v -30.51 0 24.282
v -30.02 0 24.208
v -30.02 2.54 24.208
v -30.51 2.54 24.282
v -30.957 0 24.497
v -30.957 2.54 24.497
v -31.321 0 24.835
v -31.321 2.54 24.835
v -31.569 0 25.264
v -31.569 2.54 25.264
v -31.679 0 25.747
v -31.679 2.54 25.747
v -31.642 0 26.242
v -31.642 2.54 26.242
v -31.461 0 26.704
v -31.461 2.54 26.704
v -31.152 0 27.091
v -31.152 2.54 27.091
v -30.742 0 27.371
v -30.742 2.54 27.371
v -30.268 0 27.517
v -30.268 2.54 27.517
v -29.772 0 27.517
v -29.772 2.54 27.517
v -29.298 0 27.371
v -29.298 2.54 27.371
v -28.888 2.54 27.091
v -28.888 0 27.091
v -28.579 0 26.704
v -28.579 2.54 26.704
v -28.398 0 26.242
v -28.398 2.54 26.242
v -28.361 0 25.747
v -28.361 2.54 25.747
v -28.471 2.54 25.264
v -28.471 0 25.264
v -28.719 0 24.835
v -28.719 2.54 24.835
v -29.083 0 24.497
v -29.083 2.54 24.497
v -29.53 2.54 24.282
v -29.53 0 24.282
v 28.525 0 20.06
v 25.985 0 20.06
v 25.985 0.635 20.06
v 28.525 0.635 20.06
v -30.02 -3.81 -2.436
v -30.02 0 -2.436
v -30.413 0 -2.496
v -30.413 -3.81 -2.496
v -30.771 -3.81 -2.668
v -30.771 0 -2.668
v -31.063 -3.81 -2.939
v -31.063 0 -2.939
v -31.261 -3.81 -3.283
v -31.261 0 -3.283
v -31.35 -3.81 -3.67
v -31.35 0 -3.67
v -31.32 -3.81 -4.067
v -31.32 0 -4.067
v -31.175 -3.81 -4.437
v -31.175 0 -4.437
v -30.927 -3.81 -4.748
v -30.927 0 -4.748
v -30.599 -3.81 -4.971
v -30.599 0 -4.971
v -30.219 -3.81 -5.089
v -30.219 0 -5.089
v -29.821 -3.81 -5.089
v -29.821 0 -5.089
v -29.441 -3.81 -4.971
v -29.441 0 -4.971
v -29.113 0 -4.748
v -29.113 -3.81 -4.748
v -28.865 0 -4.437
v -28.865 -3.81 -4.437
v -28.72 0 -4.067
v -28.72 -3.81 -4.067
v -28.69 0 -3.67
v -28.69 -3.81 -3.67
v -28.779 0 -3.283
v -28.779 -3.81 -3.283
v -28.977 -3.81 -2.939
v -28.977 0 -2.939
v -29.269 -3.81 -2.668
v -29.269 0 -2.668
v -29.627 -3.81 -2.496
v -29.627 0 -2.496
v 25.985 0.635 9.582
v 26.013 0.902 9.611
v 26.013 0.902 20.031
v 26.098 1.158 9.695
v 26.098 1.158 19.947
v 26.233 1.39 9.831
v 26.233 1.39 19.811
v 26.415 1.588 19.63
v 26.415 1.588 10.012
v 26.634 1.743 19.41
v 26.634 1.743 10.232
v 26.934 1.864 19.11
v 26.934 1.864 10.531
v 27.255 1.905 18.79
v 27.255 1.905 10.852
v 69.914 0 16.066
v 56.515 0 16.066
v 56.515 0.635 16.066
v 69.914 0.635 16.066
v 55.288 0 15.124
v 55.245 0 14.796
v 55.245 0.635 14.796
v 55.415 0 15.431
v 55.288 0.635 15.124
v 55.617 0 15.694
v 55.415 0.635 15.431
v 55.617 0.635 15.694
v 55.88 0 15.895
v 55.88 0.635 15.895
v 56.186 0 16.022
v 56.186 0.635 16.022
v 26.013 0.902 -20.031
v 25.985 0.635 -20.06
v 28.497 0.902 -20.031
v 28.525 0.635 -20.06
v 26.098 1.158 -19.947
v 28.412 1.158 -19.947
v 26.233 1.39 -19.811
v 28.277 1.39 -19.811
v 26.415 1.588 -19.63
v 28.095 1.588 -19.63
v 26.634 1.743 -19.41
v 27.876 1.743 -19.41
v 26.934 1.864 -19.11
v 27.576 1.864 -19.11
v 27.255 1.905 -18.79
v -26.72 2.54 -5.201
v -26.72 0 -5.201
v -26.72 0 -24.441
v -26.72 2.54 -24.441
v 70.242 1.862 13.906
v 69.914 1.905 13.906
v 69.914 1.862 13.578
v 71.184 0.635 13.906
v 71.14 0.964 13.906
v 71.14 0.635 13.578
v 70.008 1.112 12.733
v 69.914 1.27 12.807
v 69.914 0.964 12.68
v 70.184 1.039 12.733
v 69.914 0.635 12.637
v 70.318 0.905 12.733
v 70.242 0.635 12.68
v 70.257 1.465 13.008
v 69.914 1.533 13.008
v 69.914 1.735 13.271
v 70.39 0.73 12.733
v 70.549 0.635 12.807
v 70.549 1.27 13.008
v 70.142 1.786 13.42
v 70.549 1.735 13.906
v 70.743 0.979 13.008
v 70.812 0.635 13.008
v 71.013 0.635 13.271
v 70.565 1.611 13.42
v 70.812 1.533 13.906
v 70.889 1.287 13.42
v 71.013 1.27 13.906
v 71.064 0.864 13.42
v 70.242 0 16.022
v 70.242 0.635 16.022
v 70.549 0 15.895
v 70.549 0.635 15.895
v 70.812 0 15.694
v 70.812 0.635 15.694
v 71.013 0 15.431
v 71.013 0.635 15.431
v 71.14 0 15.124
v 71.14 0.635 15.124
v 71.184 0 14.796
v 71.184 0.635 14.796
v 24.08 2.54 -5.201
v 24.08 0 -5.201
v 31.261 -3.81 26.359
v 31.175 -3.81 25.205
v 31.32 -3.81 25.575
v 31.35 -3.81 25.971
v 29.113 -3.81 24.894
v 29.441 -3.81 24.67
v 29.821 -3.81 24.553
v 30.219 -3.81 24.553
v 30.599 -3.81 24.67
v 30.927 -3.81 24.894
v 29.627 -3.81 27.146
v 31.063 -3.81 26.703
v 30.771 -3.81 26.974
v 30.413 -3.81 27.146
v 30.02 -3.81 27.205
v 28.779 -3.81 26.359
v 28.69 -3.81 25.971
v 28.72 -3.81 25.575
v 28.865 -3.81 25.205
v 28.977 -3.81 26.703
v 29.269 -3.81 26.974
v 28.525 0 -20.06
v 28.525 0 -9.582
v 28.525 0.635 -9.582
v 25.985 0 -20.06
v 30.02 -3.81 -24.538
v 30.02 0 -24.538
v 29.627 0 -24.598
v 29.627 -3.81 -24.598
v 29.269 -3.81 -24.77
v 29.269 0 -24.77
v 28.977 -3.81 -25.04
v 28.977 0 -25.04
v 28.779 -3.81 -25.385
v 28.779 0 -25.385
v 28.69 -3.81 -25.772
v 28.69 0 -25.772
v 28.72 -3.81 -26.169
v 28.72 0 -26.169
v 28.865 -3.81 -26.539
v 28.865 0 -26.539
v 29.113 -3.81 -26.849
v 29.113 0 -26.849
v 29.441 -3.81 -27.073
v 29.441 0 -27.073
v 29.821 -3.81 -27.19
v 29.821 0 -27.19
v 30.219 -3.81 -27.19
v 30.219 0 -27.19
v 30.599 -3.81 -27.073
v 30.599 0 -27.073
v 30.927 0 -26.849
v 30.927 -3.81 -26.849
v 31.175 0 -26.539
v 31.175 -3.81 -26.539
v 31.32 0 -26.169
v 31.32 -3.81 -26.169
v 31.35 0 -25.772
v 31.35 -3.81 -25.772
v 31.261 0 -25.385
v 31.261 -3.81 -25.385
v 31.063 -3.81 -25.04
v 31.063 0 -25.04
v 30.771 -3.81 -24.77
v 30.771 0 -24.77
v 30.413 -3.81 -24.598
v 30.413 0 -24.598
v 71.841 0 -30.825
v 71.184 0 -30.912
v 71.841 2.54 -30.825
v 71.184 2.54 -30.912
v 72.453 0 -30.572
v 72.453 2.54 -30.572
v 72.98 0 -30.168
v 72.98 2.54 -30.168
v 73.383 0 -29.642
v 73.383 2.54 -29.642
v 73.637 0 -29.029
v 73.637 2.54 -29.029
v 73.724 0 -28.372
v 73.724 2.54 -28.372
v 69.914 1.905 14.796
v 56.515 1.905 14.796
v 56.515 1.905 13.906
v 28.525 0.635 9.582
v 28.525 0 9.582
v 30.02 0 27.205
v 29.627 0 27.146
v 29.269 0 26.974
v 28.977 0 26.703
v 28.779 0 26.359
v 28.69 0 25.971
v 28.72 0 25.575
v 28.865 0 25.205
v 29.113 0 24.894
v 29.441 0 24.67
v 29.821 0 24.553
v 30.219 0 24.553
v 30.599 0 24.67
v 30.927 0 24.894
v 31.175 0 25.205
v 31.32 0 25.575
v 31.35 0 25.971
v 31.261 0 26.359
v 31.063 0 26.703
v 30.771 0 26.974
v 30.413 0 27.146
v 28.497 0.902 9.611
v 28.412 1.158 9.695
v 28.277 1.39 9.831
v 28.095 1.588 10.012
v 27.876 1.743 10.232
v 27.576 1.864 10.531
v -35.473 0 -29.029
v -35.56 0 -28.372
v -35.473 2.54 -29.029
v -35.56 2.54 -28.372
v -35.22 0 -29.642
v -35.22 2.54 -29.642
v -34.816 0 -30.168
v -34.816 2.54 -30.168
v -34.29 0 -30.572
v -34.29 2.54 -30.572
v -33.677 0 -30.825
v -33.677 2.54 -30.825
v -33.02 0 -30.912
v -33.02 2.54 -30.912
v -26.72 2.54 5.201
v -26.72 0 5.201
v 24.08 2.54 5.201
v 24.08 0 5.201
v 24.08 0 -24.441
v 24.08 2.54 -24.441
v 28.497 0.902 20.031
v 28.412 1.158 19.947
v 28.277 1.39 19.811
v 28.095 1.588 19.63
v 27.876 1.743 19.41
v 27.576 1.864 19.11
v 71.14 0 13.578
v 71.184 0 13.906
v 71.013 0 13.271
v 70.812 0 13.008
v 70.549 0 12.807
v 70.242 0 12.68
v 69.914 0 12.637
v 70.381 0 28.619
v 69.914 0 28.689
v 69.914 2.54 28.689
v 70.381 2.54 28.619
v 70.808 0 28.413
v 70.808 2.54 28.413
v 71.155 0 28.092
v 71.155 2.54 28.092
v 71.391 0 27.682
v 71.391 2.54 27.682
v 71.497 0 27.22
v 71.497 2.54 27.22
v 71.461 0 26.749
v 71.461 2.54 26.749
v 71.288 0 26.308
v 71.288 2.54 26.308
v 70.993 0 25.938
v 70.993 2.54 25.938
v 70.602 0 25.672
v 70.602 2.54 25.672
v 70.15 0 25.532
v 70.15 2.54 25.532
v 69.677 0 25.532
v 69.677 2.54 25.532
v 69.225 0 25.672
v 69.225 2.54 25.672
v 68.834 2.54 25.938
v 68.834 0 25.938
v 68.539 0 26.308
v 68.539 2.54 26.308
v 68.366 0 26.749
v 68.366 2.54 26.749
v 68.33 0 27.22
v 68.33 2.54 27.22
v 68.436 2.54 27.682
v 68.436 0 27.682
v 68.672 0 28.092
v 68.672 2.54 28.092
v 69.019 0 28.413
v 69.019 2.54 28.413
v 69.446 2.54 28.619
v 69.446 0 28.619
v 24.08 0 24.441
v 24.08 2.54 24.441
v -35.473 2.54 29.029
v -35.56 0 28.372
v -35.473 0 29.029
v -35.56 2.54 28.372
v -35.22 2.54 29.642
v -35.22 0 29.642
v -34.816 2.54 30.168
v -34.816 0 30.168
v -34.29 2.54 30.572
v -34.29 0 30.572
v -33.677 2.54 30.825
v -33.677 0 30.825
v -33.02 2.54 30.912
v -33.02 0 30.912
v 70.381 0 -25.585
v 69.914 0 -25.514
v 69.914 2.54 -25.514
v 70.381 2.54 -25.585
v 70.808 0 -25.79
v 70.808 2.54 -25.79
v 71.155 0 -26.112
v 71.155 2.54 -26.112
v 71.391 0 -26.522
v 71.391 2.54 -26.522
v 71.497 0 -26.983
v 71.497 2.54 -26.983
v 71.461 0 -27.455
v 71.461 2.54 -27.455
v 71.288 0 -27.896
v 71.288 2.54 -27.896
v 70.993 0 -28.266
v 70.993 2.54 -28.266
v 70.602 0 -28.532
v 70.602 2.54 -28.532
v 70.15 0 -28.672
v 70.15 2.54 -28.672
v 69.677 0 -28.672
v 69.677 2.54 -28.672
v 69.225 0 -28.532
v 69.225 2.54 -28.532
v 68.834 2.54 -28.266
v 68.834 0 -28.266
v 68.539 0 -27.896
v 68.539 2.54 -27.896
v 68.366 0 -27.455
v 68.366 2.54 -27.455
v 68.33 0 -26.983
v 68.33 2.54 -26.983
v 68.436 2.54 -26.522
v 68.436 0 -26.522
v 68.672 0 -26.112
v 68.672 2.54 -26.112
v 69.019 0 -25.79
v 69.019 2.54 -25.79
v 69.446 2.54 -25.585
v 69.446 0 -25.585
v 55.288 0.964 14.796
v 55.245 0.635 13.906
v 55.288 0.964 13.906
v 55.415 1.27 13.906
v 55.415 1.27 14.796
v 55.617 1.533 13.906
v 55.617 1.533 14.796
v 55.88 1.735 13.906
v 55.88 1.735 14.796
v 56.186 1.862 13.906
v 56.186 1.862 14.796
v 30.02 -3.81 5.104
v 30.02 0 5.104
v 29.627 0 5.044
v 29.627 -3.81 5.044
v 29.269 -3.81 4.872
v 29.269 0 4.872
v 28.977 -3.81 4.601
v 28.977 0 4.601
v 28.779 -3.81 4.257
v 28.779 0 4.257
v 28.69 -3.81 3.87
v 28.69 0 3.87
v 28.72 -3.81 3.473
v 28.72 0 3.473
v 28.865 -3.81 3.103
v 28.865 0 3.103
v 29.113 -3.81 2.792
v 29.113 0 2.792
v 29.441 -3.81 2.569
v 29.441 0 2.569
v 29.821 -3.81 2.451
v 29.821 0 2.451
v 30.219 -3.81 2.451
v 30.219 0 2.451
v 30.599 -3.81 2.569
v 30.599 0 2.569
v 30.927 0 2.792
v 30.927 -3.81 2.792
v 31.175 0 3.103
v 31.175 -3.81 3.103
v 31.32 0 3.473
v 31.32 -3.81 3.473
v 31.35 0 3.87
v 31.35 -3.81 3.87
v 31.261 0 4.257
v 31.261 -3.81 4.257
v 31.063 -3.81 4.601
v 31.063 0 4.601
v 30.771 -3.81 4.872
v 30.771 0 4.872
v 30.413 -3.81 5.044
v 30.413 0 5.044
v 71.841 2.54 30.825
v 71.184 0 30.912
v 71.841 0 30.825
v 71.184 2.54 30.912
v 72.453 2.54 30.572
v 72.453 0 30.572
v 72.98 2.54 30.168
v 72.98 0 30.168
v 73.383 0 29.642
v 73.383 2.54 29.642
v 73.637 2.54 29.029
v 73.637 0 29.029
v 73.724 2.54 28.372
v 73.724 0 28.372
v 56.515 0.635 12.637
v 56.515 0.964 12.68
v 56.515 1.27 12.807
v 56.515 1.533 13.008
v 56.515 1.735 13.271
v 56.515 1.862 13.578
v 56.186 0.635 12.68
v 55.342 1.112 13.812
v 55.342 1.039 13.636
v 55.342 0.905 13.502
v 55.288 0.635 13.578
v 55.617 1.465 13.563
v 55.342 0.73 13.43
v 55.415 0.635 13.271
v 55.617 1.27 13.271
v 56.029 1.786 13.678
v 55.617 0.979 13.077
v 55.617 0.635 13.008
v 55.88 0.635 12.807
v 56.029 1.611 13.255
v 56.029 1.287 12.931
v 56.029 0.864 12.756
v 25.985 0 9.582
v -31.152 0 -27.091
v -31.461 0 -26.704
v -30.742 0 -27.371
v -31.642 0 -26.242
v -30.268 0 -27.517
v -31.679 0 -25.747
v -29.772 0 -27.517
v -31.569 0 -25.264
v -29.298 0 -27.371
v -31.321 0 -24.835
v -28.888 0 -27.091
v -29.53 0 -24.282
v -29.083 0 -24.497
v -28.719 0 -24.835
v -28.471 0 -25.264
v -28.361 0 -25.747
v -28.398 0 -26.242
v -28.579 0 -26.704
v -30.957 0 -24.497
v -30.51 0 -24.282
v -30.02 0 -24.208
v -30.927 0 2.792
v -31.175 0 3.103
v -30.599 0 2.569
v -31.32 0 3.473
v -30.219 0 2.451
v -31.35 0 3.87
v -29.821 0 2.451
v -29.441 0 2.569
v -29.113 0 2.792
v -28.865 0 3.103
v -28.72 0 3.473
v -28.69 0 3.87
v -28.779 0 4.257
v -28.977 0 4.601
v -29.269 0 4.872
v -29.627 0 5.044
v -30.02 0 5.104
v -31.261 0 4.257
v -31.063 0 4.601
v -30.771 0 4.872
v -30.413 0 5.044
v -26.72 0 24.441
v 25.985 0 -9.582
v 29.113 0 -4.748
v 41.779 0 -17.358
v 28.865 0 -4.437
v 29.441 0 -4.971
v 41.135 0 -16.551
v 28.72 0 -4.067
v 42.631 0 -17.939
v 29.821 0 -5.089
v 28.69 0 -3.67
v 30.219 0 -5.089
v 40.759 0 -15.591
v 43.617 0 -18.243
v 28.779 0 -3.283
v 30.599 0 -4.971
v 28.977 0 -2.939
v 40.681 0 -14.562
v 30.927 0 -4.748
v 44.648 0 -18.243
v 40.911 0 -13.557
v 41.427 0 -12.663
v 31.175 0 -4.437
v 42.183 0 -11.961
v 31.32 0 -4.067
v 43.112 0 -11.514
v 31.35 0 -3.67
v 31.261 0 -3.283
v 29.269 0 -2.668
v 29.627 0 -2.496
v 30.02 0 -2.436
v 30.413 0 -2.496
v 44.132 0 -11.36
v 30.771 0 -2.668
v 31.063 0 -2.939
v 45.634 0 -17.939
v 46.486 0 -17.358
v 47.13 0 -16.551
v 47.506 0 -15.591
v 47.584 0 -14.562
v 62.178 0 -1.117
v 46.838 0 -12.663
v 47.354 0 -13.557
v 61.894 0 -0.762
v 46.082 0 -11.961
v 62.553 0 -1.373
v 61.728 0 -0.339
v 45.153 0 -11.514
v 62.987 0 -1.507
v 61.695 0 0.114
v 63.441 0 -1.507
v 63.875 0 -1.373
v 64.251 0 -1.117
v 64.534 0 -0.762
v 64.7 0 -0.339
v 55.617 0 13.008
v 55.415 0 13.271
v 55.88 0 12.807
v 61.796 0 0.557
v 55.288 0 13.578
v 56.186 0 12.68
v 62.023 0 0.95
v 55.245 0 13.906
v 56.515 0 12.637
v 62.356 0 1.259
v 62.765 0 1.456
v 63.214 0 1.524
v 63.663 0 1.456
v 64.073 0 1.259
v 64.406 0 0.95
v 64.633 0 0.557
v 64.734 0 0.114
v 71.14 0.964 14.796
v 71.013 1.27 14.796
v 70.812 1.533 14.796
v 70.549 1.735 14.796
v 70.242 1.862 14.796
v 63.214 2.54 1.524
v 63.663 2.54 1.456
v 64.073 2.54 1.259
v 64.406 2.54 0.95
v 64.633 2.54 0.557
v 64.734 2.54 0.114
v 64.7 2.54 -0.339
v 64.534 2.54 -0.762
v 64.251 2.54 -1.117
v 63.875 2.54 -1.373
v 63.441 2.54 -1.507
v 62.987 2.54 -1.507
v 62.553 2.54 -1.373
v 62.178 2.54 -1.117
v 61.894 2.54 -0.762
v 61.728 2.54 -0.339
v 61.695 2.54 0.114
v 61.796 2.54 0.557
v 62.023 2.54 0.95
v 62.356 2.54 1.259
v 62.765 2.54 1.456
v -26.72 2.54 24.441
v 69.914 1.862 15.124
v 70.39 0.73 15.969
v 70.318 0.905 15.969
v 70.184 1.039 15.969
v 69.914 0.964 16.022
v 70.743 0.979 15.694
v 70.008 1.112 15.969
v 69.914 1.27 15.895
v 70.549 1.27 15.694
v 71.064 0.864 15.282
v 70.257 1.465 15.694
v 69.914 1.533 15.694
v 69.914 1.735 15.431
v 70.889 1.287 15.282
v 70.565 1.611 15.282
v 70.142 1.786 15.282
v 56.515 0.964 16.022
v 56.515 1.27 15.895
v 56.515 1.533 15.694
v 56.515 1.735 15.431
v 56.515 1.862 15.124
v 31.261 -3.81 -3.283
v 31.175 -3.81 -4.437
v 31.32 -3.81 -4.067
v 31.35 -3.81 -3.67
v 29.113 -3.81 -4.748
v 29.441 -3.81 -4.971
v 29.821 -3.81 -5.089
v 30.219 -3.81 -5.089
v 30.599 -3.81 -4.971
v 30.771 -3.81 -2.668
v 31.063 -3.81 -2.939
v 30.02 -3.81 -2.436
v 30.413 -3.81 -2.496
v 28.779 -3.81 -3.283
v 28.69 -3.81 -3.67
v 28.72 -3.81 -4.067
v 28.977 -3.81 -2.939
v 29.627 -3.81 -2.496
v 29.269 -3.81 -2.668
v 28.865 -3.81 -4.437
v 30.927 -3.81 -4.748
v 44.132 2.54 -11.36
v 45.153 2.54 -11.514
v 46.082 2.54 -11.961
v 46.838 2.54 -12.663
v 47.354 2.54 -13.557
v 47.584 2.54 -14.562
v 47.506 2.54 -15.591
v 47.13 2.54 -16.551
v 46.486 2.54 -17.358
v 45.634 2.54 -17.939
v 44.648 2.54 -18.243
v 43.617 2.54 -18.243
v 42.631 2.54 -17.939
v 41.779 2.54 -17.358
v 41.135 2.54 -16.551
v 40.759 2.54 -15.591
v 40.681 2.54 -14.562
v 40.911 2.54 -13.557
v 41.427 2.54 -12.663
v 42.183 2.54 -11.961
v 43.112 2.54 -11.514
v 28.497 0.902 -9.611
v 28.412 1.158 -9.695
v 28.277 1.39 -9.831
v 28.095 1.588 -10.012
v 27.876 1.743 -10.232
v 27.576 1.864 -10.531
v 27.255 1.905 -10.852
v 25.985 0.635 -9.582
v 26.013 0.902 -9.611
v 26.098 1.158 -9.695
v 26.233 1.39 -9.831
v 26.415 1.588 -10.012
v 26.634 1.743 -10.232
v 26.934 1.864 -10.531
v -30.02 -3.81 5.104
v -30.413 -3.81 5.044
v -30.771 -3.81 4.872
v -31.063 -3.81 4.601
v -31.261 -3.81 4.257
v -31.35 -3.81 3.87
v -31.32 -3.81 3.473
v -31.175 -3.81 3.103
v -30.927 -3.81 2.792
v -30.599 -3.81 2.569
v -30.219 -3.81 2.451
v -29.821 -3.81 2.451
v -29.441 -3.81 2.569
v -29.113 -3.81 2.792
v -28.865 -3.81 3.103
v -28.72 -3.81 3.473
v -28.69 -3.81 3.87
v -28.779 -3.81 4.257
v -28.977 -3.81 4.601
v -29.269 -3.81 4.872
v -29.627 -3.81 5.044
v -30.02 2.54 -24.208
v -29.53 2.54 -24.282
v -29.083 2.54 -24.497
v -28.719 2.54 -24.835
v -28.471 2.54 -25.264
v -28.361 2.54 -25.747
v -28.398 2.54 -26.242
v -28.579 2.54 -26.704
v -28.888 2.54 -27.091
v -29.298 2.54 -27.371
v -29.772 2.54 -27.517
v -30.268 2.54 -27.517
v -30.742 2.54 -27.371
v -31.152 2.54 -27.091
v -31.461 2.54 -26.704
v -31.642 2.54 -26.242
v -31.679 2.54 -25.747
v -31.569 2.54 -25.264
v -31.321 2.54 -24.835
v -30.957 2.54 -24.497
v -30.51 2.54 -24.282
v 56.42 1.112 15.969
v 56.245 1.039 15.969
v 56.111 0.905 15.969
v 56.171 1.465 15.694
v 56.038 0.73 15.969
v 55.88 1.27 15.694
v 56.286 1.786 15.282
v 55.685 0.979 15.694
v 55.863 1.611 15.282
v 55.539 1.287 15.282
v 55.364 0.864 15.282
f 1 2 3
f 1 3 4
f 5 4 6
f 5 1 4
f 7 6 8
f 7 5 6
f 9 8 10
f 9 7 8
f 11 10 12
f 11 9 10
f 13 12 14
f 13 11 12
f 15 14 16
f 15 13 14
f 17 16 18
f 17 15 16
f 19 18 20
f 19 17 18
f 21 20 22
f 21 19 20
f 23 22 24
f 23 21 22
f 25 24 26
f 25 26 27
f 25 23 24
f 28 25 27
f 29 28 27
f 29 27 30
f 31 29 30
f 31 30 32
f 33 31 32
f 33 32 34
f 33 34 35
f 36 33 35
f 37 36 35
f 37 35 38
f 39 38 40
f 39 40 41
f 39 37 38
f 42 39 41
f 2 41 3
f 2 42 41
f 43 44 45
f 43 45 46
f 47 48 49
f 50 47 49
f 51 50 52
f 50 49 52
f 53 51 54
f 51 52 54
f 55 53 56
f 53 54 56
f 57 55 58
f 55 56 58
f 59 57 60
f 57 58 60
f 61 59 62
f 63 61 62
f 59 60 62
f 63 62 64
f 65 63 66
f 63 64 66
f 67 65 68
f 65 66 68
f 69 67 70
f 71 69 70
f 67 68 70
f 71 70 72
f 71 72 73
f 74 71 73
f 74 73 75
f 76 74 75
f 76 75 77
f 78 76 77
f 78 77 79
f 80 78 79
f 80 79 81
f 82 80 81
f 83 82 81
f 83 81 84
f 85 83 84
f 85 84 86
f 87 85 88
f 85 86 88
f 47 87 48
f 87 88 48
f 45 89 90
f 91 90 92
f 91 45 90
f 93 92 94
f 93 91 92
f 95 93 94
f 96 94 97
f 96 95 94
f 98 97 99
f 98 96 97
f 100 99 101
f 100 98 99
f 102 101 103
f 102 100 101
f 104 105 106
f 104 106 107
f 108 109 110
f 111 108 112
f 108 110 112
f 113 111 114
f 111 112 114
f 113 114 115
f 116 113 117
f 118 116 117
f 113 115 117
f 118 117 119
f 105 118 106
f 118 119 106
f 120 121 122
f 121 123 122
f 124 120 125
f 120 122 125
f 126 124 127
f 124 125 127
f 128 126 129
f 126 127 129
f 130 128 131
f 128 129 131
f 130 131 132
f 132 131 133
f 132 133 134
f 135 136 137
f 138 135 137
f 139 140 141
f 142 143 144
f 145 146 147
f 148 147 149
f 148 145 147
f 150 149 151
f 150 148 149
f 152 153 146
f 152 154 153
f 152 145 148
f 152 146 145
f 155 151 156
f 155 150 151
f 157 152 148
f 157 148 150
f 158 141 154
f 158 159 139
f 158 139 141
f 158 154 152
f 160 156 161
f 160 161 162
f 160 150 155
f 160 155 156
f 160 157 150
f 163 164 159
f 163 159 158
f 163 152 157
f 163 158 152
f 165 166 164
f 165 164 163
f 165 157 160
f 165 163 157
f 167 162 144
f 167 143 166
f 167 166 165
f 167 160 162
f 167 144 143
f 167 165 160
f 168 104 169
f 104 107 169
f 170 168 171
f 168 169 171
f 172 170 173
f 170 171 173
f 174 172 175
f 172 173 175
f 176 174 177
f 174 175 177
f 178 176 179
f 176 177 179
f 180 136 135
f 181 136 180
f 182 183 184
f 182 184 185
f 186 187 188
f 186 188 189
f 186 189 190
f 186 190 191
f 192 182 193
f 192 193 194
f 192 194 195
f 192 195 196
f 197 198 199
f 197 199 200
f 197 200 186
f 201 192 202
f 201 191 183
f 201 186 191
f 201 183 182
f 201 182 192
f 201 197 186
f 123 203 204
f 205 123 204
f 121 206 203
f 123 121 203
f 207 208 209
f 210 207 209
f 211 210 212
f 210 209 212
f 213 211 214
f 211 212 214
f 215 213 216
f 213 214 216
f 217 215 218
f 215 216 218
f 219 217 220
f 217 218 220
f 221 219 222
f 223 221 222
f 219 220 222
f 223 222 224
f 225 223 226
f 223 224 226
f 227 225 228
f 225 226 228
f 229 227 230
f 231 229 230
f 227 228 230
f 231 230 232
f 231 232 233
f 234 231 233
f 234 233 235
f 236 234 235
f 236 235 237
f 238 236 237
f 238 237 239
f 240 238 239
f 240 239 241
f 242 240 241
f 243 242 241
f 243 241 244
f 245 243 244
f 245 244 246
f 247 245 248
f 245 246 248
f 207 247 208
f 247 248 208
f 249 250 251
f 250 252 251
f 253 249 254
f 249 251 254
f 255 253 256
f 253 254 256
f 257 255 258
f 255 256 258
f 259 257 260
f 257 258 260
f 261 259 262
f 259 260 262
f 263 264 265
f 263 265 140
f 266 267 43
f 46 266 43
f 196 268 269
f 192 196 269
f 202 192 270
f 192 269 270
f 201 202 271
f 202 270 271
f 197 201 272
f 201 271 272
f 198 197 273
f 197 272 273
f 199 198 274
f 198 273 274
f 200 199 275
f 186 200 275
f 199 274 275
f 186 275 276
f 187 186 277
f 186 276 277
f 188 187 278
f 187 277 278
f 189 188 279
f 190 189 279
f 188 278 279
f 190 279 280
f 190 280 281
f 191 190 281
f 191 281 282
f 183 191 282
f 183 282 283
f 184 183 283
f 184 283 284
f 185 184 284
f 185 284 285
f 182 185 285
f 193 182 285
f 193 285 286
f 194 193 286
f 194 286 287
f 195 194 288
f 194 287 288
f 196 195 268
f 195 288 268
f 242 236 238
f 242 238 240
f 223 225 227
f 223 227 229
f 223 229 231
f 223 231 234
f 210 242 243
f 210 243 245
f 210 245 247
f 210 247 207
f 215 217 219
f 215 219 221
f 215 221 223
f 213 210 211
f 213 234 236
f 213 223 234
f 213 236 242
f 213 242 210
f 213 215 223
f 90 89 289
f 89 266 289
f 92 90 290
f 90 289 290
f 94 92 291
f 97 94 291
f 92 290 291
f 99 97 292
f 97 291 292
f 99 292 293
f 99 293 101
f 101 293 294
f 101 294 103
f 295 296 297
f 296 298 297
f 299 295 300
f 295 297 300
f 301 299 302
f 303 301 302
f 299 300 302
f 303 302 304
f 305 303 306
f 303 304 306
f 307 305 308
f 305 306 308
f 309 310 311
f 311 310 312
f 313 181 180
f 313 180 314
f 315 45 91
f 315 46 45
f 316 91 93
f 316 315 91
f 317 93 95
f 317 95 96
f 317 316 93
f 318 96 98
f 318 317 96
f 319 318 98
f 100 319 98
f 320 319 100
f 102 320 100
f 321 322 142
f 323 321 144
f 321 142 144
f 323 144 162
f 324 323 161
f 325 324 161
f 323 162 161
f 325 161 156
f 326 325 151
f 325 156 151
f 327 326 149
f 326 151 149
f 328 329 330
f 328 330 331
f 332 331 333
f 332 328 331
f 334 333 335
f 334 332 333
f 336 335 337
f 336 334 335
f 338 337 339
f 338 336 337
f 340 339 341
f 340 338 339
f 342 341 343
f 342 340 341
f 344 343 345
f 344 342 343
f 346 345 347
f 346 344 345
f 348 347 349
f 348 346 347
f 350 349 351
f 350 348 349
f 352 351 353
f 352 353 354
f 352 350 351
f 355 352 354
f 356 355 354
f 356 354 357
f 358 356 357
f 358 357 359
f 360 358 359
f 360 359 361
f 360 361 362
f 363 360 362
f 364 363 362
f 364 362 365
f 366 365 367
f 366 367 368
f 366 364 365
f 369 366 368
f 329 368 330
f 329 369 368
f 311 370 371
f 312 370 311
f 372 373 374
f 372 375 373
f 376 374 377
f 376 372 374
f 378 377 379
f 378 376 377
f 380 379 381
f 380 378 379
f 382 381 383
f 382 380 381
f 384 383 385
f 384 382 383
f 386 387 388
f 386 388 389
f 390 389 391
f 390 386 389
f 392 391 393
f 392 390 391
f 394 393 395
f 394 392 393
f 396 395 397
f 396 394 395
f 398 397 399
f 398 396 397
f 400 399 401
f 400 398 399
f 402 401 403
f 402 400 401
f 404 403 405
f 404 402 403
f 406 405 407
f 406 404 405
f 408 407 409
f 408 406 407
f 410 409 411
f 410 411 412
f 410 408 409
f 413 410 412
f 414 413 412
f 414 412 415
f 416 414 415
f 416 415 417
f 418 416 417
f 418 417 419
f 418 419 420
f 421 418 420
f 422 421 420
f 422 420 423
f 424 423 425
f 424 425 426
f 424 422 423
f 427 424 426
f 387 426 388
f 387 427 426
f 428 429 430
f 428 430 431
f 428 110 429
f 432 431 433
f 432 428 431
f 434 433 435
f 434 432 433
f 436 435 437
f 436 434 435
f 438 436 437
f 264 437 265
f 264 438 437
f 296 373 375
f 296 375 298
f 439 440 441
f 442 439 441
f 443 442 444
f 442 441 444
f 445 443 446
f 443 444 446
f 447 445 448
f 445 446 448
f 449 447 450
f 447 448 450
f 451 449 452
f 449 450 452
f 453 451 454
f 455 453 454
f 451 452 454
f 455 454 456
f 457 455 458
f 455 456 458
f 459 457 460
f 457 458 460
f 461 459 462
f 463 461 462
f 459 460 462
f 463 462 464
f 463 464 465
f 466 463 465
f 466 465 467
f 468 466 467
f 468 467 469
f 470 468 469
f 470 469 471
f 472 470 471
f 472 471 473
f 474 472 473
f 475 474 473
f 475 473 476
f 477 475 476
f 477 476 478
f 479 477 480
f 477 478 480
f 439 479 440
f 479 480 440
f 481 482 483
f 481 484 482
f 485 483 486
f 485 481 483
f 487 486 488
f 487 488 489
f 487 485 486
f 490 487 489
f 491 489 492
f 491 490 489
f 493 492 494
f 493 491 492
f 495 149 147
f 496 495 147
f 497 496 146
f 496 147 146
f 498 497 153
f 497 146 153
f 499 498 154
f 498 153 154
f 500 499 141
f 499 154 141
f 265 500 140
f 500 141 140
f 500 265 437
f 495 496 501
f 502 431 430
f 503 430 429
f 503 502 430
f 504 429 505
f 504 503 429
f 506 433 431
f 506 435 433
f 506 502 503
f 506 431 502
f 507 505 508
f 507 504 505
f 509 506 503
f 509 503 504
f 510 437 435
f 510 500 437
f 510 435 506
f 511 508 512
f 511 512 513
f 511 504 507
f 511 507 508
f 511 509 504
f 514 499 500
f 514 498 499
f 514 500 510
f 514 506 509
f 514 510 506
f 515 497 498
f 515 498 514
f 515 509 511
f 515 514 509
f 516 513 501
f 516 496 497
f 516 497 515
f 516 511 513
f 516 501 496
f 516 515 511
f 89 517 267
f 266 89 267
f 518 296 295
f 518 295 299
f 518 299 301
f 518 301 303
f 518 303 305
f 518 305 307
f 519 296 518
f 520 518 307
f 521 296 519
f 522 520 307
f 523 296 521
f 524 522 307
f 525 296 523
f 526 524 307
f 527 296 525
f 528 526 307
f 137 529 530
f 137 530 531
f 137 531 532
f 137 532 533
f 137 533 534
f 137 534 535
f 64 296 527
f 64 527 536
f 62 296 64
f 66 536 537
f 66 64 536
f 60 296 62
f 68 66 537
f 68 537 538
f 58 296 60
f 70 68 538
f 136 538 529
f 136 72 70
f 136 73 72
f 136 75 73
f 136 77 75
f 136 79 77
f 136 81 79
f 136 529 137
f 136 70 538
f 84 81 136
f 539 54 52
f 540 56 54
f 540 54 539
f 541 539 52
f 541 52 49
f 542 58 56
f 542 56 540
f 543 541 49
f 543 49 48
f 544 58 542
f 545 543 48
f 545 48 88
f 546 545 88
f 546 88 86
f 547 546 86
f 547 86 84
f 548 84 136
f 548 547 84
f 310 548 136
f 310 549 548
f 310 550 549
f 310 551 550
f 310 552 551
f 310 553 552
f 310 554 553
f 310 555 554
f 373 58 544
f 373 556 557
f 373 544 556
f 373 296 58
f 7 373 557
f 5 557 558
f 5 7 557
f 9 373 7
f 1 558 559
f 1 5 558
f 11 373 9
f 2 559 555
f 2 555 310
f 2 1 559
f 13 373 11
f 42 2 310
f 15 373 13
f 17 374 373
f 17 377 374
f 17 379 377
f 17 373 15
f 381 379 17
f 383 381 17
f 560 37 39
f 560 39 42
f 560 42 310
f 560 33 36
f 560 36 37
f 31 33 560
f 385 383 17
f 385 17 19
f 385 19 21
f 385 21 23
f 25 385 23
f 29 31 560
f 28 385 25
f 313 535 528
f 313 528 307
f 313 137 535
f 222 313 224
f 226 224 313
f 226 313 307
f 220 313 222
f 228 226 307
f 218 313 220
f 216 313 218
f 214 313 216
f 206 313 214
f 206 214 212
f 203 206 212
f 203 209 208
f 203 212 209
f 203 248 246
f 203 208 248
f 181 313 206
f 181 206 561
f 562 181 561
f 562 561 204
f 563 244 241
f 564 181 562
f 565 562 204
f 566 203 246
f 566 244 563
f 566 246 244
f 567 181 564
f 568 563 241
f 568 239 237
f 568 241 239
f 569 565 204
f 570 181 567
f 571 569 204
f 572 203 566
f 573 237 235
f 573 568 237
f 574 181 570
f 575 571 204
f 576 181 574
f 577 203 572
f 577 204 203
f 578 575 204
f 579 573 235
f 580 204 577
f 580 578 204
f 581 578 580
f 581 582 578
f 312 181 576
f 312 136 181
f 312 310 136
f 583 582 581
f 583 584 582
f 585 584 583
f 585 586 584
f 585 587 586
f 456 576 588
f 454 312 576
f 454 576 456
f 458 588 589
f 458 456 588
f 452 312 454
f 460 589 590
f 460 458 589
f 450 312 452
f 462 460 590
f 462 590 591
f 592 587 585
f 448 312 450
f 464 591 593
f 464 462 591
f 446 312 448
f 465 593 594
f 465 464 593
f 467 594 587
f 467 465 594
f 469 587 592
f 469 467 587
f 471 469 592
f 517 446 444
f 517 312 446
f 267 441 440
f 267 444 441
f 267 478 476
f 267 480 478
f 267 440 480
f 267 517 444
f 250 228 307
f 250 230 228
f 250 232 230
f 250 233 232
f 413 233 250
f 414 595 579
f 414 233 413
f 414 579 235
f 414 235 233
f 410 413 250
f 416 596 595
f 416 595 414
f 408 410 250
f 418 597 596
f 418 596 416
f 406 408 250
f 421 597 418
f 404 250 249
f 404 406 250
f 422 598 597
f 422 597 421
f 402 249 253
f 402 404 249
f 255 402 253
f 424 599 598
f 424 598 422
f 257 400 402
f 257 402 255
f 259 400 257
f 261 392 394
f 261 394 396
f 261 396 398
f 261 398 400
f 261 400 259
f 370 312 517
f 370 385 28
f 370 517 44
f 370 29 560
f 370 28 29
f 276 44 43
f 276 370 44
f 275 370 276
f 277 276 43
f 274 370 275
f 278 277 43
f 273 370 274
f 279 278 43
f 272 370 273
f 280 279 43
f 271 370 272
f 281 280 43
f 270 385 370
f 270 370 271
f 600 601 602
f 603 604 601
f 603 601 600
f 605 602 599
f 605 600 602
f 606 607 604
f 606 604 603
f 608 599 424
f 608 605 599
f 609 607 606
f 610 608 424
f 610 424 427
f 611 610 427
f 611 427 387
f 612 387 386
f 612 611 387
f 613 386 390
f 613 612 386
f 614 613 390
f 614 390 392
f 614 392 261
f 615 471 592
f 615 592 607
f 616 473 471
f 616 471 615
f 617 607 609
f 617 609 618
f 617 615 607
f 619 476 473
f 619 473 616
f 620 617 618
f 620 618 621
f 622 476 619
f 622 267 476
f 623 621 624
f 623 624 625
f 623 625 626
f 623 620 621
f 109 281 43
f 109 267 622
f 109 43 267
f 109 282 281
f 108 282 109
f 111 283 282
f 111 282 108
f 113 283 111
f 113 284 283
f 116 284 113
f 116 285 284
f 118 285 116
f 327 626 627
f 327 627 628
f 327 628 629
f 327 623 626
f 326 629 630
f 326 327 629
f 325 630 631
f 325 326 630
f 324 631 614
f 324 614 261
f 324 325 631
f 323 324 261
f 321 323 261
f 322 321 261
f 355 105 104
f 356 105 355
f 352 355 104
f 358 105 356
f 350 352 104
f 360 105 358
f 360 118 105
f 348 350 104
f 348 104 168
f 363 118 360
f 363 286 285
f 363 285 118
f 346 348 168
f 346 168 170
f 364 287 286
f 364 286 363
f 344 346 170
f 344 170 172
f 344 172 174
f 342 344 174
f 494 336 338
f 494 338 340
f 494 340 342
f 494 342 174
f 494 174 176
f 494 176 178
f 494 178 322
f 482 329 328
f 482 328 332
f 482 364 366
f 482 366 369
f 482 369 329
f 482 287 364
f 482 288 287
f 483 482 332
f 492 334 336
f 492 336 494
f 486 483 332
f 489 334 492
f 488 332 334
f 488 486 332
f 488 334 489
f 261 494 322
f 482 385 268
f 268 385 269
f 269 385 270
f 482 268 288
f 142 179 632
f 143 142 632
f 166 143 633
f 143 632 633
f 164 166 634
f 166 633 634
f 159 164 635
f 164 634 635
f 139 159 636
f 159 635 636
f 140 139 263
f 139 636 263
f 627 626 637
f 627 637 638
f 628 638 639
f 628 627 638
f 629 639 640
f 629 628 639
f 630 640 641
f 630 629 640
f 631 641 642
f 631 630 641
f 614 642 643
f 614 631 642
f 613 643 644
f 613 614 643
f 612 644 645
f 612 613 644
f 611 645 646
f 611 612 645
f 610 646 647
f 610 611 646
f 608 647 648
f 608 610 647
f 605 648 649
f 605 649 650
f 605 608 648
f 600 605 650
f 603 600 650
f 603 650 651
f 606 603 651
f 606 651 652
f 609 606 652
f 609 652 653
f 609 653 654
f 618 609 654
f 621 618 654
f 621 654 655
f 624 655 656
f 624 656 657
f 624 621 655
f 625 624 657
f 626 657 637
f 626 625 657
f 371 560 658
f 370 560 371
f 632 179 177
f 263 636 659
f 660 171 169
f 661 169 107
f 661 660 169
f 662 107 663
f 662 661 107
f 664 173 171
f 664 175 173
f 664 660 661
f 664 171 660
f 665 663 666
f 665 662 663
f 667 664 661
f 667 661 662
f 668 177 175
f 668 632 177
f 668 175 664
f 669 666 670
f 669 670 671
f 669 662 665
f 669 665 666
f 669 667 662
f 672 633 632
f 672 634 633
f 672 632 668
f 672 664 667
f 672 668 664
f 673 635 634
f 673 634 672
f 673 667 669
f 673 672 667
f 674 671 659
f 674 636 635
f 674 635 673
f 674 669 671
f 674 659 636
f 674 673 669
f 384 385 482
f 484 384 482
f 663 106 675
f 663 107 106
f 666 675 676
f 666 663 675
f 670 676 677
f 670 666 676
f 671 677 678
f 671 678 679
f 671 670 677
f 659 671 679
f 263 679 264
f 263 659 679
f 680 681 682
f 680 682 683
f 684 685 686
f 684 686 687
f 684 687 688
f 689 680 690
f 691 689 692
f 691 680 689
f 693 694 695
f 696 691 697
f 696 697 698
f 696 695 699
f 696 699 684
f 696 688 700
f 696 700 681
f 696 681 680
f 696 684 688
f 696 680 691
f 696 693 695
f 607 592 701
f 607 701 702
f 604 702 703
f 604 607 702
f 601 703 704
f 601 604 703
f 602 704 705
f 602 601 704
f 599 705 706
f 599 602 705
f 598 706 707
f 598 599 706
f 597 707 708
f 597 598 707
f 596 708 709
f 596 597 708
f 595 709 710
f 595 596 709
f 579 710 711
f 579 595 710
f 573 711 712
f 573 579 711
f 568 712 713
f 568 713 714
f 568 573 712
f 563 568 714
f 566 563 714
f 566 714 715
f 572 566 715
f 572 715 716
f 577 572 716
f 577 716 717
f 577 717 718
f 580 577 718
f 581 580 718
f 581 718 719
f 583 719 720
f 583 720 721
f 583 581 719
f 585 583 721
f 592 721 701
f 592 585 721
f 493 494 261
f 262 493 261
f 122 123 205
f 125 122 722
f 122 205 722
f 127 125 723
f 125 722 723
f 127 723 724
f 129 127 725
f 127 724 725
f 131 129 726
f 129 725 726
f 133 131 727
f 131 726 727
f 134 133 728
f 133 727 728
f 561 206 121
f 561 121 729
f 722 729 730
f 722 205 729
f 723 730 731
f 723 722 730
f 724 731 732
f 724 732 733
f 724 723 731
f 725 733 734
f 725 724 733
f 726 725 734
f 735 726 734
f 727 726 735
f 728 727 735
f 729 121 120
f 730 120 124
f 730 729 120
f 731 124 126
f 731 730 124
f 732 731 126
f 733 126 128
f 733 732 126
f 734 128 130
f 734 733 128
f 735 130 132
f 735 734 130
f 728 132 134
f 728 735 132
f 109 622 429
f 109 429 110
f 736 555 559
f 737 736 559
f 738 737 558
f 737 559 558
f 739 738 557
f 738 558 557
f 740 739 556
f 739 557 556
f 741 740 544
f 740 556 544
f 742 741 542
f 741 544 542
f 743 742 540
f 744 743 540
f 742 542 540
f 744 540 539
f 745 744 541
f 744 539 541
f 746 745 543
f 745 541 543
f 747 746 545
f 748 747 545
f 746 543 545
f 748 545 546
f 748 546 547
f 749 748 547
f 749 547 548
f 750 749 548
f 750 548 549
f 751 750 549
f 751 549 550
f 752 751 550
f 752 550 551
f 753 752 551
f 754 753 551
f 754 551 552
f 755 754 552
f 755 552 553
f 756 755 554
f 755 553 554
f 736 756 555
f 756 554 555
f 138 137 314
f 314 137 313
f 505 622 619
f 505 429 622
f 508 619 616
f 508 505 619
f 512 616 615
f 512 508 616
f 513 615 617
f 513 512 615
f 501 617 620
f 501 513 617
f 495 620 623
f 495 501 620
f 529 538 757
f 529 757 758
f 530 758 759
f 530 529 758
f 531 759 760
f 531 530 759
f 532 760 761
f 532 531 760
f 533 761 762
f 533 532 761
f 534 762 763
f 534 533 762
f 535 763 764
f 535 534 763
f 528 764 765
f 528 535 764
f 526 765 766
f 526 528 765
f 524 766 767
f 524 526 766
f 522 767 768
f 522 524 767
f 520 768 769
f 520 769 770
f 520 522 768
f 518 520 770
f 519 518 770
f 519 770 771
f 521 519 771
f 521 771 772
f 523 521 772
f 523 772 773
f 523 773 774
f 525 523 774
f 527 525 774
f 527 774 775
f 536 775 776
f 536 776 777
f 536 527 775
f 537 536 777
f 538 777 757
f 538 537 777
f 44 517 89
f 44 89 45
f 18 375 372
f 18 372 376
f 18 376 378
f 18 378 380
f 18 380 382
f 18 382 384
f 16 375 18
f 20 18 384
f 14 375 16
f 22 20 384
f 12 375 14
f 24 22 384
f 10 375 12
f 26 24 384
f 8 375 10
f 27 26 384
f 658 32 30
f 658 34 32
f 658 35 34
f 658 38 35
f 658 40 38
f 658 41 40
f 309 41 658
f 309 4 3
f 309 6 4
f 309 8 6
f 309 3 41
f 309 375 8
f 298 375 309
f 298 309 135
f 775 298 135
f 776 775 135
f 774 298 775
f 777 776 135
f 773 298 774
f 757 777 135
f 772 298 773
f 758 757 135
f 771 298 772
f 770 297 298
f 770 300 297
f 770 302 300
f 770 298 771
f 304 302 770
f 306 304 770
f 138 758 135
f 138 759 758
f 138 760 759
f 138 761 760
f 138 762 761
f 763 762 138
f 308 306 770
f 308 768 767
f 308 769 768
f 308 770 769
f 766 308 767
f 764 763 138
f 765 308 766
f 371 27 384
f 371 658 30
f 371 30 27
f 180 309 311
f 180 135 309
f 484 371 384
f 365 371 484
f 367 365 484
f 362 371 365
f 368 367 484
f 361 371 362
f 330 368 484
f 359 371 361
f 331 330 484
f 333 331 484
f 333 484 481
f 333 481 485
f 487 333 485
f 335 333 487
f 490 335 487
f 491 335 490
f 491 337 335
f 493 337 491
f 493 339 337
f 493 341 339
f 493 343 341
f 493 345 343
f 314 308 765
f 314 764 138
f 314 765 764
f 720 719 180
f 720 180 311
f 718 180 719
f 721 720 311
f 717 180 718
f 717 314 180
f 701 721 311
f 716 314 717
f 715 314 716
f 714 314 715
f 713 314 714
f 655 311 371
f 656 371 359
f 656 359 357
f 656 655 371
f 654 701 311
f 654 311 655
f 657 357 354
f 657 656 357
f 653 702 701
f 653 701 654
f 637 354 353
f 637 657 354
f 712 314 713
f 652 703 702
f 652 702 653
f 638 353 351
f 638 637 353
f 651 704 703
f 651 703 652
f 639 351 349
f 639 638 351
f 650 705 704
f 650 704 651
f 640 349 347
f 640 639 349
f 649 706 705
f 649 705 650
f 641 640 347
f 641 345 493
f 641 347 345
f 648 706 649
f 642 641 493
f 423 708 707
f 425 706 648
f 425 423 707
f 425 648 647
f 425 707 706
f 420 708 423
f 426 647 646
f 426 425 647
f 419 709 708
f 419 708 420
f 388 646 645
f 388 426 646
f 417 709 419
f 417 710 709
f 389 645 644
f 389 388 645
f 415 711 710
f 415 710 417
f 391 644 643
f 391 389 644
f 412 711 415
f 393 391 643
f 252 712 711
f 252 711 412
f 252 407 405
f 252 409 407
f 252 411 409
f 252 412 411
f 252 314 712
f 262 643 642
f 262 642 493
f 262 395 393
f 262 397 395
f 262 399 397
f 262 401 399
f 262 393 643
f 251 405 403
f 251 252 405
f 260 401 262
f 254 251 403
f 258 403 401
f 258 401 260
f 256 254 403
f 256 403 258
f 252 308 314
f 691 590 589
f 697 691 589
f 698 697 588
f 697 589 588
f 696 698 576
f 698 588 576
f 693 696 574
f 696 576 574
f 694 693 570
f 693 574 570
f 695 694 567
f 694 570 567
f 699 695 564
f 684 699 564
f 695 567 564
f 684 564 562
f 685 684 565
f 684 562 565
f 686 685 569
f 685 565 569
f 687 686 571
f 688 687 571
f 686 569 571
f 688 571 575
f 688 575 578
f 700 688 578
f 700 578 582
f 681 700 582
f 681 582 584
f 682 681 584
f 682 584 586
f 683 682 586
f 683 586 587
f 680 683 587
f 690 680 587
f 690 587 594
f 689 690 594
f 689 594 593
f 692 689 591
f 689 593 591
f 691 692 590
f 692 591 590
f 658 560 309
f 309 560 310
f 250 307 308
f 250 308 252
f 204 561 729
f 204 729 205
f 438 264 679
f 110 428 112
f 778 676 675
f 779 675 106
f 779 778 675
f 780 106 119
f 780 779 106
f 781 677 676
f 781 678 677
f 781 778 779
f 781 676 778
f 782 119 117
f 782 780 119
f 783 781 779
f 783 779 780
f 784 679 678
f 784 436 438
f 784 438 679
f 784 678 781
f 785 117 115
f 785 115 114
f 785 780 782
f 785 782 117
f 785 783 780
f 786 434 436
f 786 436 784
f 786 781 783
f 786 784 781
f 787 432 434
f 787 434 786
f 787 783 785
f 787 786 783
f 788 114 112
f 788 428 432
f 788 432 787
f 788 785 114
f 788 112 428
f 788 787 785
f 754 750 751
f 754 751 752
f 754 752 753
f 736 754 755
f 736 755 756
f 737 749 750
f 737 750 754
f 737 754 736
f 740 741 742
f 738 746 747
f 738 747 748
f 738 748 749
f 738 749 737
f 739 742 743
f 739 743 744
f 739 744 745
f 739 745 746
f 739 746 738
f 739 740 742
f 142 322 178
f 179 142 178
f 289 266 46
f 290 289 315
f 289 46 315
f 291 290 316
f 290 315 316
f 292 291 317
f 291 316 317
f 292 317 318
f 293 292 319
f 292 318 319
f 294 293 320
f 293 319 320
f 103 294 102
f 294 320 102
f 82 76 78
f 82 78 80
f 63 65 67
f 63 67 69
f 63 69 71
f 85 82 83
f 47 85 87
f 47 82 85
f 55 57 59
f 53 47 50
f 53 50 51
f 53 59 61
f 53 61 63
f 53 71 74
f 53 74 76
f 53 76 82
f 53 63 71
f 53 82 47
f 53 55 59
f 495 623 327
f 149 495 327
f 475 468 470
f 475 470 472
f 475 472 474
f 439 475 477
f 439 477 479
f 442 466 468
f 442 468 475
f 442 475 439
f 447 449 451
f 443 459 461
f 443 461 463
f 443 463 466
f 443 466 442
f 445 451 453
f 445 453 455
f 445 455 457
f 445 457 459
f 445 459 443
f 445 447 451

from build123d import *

# Parameters (mm, degrees)
SKETCH1_W           = 109.2835
SKETCH1_H           = 61.8236
SKETCH1_R           = 3.46075
SKETCH1_R_2         = 1.6637
SKETCH1_R_3         = 1.524
SKETCH1_R_4         = 1.5875
SKETCH1_W_2         = 50.8
SKETCH1_H_2         = 19.2405
BOSS_EXTRUDE1_DEPTH = 2.54
SKETCH5_W           = 2.54
SKETCH5_H           = 10.4775
SKETCH5_W_2         = 15.9385
SKETCH5_H_2         = 3.429
CUT_EXTRUDE1_DEPTH  = 1.905
FILLET1_R           = 1.27
FILLET2_R           = 2.54
SKETCH6_R           = 1.6637
BOSS_EXTRUDE2_DEPTH = 2.54
SKETCH7_R           = 1.3335
BOSS_EXTRUDE3_DEPTH = 3.81


with BuildPart() as part:
    # Sketch1 → Boss-Extrude1 (new body)
    with BuildSketch(Plane(origin=(0, 0, 0), x_dir=(1, 0, 0), z_dir=(0, 1, 0))):
        with Locations((19.08175, 0)):
            Rectangle(SKETCH1_W, SKETCH1_H)
        with Locations(Location((44.1325, 14.8209, 0), (0, 0, 270))):
            Circle(SKETCH1_R, mode=Mode.SUBTRACT)
        with Locations(Location((-30.02, 25.8718, 0), (0, 0, 270))):
            Circle(SKETCH1_R_2, mode=Mode.SUBTRACT)
        with Locations(Location((30.02, 25.8718, 0), (0, 0, 90))):
            Circle(SKETCH1_R_2, mode=Mode.SUBTRACT)
        with Locations(Location((-30.02, 3.77, 0), (0, 0, 90))):
            Circle(SKETCH1_R_2, mode=Mode.SUBTRACT)
        with Locations(Location((30.02, 3.77, 0), (0, 0, 270))):
            Circle(SKETCH1_R_2, mode=Mode.SUBTRACT)
        with Locations(Location((30.02, -3.77, 0), (0, 0, 90))):
            Circle(SKETCH1_R_2, mode=Mode.SUBTRACT)
        with Locations(Location((-30.02, -3.77, 0), (0, 0, 270))):
            Circle(SKETCH1_R_2, mode=Mode.SUBTRACT)
        with Locations(Location((-30.02, -25.8718, 0), (0, 0, 90))):
            Circle(SKETCH1_R_2, mode=Mode.SUBTRACT)
        with Locations(Location((30.02, -25.8718, 0), (0, 0, 270))):
            Circle(SKETCH1_R_2, mode=Mode.SUBTRACT)
        with Locations(Location((63.21425, 0, 0), (0, 0, 270))):
            Circle(SKETCH1_R_3, mode=Mode.SUBTRACT)
        with Locations(Location((69.9135, 27.1018, 0), (0, 0, 270))):
            Circle(SKETCH1_R_4, mode=Mode.SUBTRACT)
        with Locations(Location((69.9135, -27.1018, 0), (0, 0, 270))):
            Circle(SKETCH1_R_4, mode=Mode.SUBTRACT)
        with Locations((-1.32, 14.8209)):
            Rectangle(SKETCH1_W_2, SKETCH1_H_2, mode=Mode.SUBTRACT)
        with Locations((-1.32, -14.8209)):
            Rectangle(SKETCH1_W_2, SKETCH1_H_2, mode=Mode.SUBTRACT)
    extrude(amount=BOSS_EXTRUDE1_DEPTH)

    # Sketch5 → Cut-Extrude1 (cut)
    with BuildSketch(Plane.XZ):
        with Locations((27.255, -14.8209)):
            Rectangle(SKETCH5_W, SKETCH5_H)
        with Locations((27.255, 14.8209)):
            Rectangle(SKETCH5_W, SKETCH5_H)
        with Locations((63.21425, 14.351)):
            Rectangle(SKETCH5_W_2, SKETCH5_H_2)
    extrude(amount=-CUT_EXTRUDE1_DEPTH, mode=Mode.SUBTRACT)

    # Fillet1
    fillet1_edges = [part.edges().sort_by_distance(p)[0] for p in [
        (25.985, 1.905, -14.8209),
        (27.255, 1.905, -9.58215),
        (28.525, 1.905, -14.8209),
        (27.255, 1.905, -20.05965),
        (25.985, 1.905, 14.8209),
        (27.255, 1.905, 20.05965),
        (28.525, 1.905, 14.8209),
        (27.255, 1.905, 9.58215),
        (71.1835, 1.905, 14.351),
        (71.1835, 0.9525, 16.0655),
        (63.21425, 1.905, 12.6365),
        (71.1835, 0.9525, 12.6365),
        (55.245, 1.905, 14.351),
        (55.245, 0.9525, 12.6365),
        (63.21425, 1.905, 16.0655),
        (55.245, 0.9525, 16.0655),
    ]]
    fillet(fillet1_edges, radius=FILLET1_R - 0.0001)  # a hair under: the kernel refuses the full size

    # Fillet2
    fillet2_edges = [part.edges().sort_by_distance(p)[0] for p in [
        (-35.56, 1.27, -30.9118),
        (73.7235, 1.27, -30.9118),
        (73.7235, 1.27, 30.9118),
        (-35.56, 1.27, 30.9118),
    ]]
    fillet(fillet2_edges, radius=FILLET2_R)

    # Sketch6 → Boss-Extrude2 (add)
    with BuildSketch(Plane.XZ):
        with Locations((-30.02, 3.77)):
            Circle(SKETCH6_R)
        with Locations((-30.02, -3.77)):
            Circle(SKETCH6_R)
        with Locations((30.02, -25.8718)):
            Circle(SKETCH6_R)
        with Locations((30.02, 25.8718)):
            Circle(SKETCH6_R)
        with Locations((30.02, 3.77)):
            Circle(SKETCH6_R)
        with Locations((30.02, -3.77)):
            Circle(SKETCH6_R)
    extrude(amount=-BOSS_EXTRUDE2_DEPTH)

    # Sketch7 → Boss-Extrude3 (add)
    with BuildSketch(Plane.XZ):
        with Locations(Location((-30.02, 3.77, 0), (0, 0, 90))):
            Circle(SKETCH7_R)
        with Locations(Location((-30.02, -3.77, 0), (0, 0, 90))):
            Circle(SKETCH7_R)
        with Locations(Location((30.02, -25.8718, 0), (0, 0, 90))):
            Circle(SKETCH7_R)
        with Locations(Location((30.02, 25.8718, 0), (0, 0, 90))):
            Circle(SKETCH7_R)
        with Locations(Location((30.02, -3.77, 0), (0, 0, 90))):
            Circle(SKETCH7_R)
        with Locations(Location((30.02, 3.77, 0), (0, 0, 90))):
            Circle(SKETCH7_R)
    extrude(amount=BOSS_EXTRUDE3_DEPTH)


solid = part.part
